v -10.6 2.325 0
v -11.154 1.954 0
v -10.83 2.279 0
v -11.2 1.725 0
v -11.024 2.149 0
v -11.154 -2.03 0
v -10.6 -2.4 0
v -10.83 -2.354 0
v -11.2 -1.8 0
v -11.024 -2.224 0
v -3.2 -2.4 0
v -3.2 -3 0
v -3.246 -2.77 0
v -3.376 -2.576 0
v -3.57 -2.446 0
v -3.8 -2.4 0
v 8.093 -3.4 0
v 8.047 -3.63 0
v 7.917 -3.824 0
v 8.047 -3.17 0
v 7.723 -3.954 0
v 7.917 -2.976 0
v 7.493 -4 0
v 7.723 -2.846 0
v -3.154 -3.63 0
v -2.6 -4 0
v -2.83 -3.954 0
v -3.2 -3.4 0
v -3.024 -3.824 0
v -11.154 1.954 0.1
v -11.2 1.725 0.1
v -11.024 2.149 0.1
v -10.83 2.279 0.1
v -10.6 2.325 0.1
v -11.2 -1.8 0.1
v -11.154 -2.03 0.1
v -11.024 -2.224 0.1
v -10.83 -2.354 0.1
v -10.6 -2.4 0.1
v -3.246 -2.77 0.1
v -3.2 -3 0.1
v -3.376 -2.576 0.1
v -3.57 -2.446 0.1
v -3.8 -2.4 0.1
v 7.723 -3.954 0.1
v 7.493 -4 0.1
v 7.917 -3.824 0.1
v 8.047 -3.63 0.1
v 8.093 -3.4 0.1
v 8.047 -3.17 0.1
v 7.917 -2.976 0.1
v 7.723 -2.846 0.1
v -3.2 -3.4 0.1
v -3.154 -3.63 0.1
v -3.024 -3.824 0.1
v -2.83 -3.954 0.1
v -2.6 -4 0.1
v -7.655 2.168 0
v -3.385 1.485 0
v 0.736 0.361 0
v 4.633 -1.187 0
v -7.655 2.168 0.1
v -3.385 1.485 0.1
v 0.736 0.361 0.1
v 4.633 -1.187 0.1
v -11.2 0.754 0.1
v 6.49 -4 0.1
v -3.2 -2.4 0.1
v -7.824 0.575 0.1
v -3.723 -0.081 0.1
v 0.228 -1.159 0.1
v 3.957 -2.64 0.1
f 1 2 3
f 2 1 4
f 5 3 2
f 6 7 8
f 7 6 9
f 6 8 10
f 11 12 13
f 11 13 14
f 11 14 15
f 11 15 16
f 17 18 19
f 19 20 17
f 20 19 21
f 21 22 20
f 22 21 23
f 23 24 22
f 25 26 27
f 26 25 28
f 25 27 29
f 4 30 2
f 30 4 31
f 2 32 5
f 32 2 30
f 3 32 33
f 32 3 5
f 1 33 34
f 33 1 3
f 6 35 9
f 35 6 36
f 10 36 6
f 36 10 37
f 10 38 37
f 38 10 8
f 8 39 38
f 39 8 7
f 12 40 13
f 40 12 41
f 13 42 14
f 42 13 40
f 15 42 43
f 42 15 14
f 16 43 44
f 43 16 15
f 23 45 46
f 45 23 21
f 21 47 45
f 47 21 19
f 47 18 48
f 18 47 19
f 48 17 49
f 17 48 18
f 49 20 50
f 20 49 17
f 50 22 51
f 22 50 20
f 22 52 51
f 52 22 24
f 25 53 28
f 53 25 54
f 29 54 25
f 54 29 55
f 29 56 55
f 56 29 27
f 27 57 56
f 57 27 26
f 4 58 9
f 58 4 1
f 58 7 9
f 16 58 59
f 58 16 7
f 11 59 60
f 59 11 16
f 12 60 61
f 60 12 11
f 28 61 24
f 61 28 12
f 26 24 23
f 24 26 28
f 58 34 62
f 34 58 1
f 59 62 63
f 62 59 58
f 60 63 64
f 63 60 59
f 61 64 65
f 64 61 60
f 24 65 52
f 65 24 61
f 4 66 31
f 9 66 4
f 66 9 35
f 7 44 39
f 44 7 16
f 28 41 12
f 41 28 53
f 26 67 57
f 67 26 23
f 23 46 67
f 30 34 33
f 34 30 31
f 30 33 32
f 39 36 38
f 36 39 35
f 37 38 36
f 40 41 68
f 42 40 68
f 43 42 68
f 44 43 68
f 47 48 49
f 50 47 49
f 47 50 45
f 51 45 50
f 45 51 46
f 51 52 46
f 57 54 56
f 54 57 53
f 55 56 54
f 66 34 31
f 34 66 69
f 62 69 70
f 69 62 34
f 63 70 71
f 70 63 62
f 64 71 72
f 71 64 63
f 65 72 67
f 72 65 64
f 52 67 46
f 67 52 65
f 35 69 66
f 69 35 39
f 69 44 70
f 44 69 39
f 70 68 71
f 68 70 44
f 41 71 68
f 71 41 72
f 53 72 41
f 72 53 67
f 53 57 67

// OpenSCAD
// file: ../p/7-16cyli.scad
use <../lib.scad>
function ldraw_lib__7_16cyli() = [
// 0 Cylinder 0.4375
// 0 Name: 7-16cyli.dat
// 0 Author: Magnus Forsberg [MagFors]
// 0 !LDRAW_ORG Primitive UPDATE 2024-01
// 0 !LICENSE Licensed under CC BY 4.0 : see CAreadme.txt
// 
// 0 BFC CERTIFY CCW
  [0,"BFC","CERTIFY"],
  [0,"BFC","CCW"],
// 
// 0 !HISTORY 2009-05-02 [PTadmin] Official Update 2009-01
// 0 !HISTORY 2024-01-03 [MagFors] Complete regeneration, original by guyvivan
// 0 !HISTORY 2024-01-29 [OrionP] Official Update 2024-01
// 
// 4 16 0.9239 0 0.3827 1 0 0 1 1 0 0.9239 1 0.3827
  [4,16,0.9239,0,0.3827,1,0,0,1,1,0,0.9239,1,0.3827],
// 4 16 0.7071 0 0.7071 0.9239 0 0.3827 0.9239 1 0.3827 0.7071 1 0.7071
  [4,16,0.7071,0,0.7071,0.9239,0,0.3827,0.9239,1,0.3827,0.7071,1,0.7071],
// 4 16 0.3827 0 0.9239 0.7071 0 0.7071 0.7071 1 0.7071 0.3827 1 0.9239
  [4,16,0.3827,0,0.9239,0.7071,0,0.7071,0.7071,1,0.7071,0.3827,1,0.9239],
// 4 16 0 0 1 0.3827 0 0.9239 0.3827 1 0.9239 0 1 1
  [4,16,0,0,1,0.3827,0,0.9239,0.3827,1,0.9239,0,1,1],
// 4 16 -0.3827 0 0.9239 0 0 1 0 1 1 -0.3827 1 0.9239
  [4,16,-0.3827,0,0.9239,0,0,1,0,1,1,-0.3827,1,0.9239],
// 4 16 -0.7071 0 0.7071 -0.3827 0 0.9239 -0.3827 1 0.9239 -0.7071 1 0.7071
  [4,16,-0.7071,0,0.7071,-0.3827,0,0.9239,-0.3827,1,0.9239,-0.7071,1,0.7071],
// 4 16 -0.9239 0 0.3827 -0.7071 0 0.7071 -0.7071 1 0.7071 -0.9239 1 0.3827
  [4,16,-0.9239,0,0.3827,-0.7071,0,0.7071,-0.7071,1,0.7071,-0.9239,1,0.3827],
// 0 // conditional lines
// 5 24 1 1 0 1 0 0 1 1 -0.4142 0.9239 1 0.3827
  [5,24,1,1,0,1,0,0,1,1,-0.4142,0.9239,1,0.3827],
// 5 24 0.9239 1 0.3827 0.9239 0 0.3827 1 1 0 0.7071 1 0.7071
  [5,24,0.9239,1,0.3827,0.9239,0,0.3827,1,1,0,0.7071,1,0.7071],
// 5 24 0.7071 1 0.7071 0.7071 0 0.7071 0.9239 1 0.3827 0.3827 1 0.9239
  [5,24,0.7071,1,0.7071,0.7071,0,0.7071,0.9239,1,0.3827,0.3827,1,0.9239],
// 5 24 0.3827 1 0.9239 0.3827 0 0.9239 0.7071 1 0.7071 0 1 1
  [5,24,0.3827,1,0.9239,0.3827,0,0.9239,0.7071,1,0.7071,0,1,1],
// 5 24 0 1 1 0 0 1 0.3827 1 0.9239 -0.3827 1 0.9239
  [5,24,0,1,1,0,0,1,0.3827,1,0.9239,-0.3827,1,0.9239],
// 5 24 -0.3827 1 0.9239 -0.3827 0 0.9239 0 1 1 -0.7071 1 0.7071
  [5,24,-0.3827,1,0.9239,-0.3827,0,0.9239,0,1,1,-0.7071,1,0.7071],
// 5 24 -0.7071 1 0.7071 -0.7071 0 0.7071 -0.3827 1 0.9239 -0.9239 1 0.3827
  [5,24,-0.7071,1,0.7071,-0.7071,0,0.7071,-0.3827,1,0.9239,-0.9239,1,0.3827],
// 5 24 -0.9239 1 0.3827 -0.9239 0 0.3827 -0.7071 1 0.7071 -1.0824 1 0
  [5,24,-0.9239,1,0.3827,-0.9239,0,0.3827,-0.7071,1,0.7071,-1.0824,1,0],
// 0 // Build by LDPartEditor (PrimGen 2.X)
];
module ldraw_lib__7_16cyli(step=0, col=false, unit=2/5, alt=false, line=0.2, solid=!$preview)
    makepoly(ldraw_lib__7_16cyli(), step=step, col=col, unit=unit, alt=alt, line=line, solid=solid);
ldraw_lib__7_16cyli(line=0.2);
// file: ../p/1-4cyli.scad
use <../lib.scad>
function ldraw_lib__1_4cyli() = [
// 0 Cylinder 0.25
// 0 Name: 1-4cyli.dat
// 0 Author: James Jessiman
// 0 !LDRAW_ORG Primitive UPDATE 2012-01
// 0 !LICENSE Licensed under CC BY 4.0 : see CAreadme.txt
// 
// 0 BFC CERTIFY CCW
  [0,"BFC","CERTIFY"],
  [0,"BFC","CCW"],
// 
// 0 !HISTORY 2002-03-23 [sbliss] Added BFC statement.
// 0 !HISTORY 2002-04-25 [PTadmin] Official Update 2002-02
// 0 !HISTORY 2007-06-22 [PTadmin] Header formatted for Contributor Agreement
// 0 !HISTORY 2008-07-01 [PTadmin] Official Update 2008-01
// 0 !HISTORY 2012-02-16 [Philo] Changed to CCW
// 0 !HISTORY 2012-03-30 [PTadmin] Official Update 2012-01
// 
// 
// 4 16 1 1 0 0.9239 1 0.3827 0.9239 0 0.3827 1 0 0
  [4,16,1,1,0,0.9239,1,0.3827,0.9239,0,0.3827,1,0,0],
// 5 24 1 0 0 1 1 0 0.9239 0 0.3827 1 0 -1
  [5,24,1,0,0,1,1,0,0.9239,0,0.3827,1,0,-1],
// 4 16 0.9239 1 0.3827 0.7071 1 0.7071 0.7071 0 0.7071 0.9239 0 0.3827
  [4,16,0.9239,1,0.3827,0.7071,1,0.7071,0.7071,0,0.7071,0.9239,0,0.3827],
// 5 24 0.9239 0 0.3827 0.9239 1 0.3827 0.7071 0 0.7071 1 0 0
  [5,24,0.9239,0,0.3827,0.9239,1,0.3827,0.7071,0,0.7071,1,0,0],
// 4 16 0.7071 1 0.7071 0.3827 1 0.9239 0.3827 0 0.9239 0.7071 0 0.7071
  [4,16,0.7071,1,0.7071,0.3827,1,0.9239,0.3827,0,0.9239,0.7071,0,0.7071],
// 5 24 0.7071 0 0.7071 0.7071 1 0.7071 0.3827 0 0.9239 0.9239 0 0.3827
  [5,24,0.7071,0,0.7071,0.7071,1,0.7071,0.3827,0,0.9239,0.9239,0,0.3827],
// 4 16 0.3827 1 0.9239 0 1 1 0 0 1 0.3827 0 0.9239
  [4,16,0.3827,1,0.9239,0,1,1,0,0,1,0.3827,0,0.9239],
// 5 24 0.3827 0 0.9239 0.3827 1 0.9239 0 0 1 0.7071 0 0.7071
  [5,24,0.3827,0,0.9239,0.3827,1,0.9239,0,0,1,0.7071,0,0.7071],
// 5 24 0 0 1 0 1 1 0.3827 0 0.9239 -1 0 1
  [5,24,0,0,1,0,1,1,0.3827,0,0.9239,-1,0,1],
];
module ldraw_lib__1_4cyli(step=0, col=false, unit=2/5, alt=false, line=0.2, solid=!$preview)
    makepoly(ldraw_lib__1_4cyli(), step=step, col=col, unit=unit, alt=alt, line=line, solid=solid);
ldraw_lib__1_4cyli(line=0.2);
// file: ../p/7-16chrd.scad
use <../lib.scad>
function ldraw_lib__7_16chrd() = [
// 0 Chord 0.4375
// 0 Name: 7-16chrd.dat
// 0 Author: Willy Tschager [Holly-Wood]
// 0 !LDRAW_ORG Primitive UPDATE 2024-01
// 0 !LICENSE Licensed under CC BY 4.0 : see CAreadme.txt
// 
// 0 BFC CERTIFY CCW
  [0,"BFC","CERTIFY"],
  [0,"BFC","CCW"],
// 
// 0 !HISTORY 2009-12-29 [PTadmin] Official Update 2009-03
// 0 !HISTORY 2024-01-10 [Holly-Wood] Complete re-write, original by guyvivan
// 0 !HISTORY 2024-01-29 [OrionP] Official Update 2024-01
// 
// 4 16 -.7071 0 .7071 -.9239 0 .3827 1 0 0 .9239 0 .3827
  [4,16,-.7071,0,.7071,-.9239,0,.3827,1,0,0,.9239,0,.3827],
// 4 16 -.7071 0 .7071 .9239 0 .3827 .7071 0 .7071 -.3827 0 .9239
  [4,16,-.7071,0,.7071,.9239,0,.3827,.7071,0,.7071,-.3827,0,.9239],
// 4 16 -.3827 0 .9239 .7071 0 .7071 .3827 0 .9239 0 0 1
  [4,16,-.3827,0,.9239,.7071,0,.7071,.3827,0,.9239,0,0,1],
// 0 // Based on LDPartEditor (PrimGen 2.X)
];
module ldraw_lib__7_16chrd(step=0, col=false, unit=2/5, alt=false, line=0.2, solid=!$preview)
    makepoly(ldraw_lib__7_16chrd(), step=step, col=col, unit=unit, alt=alt, line=line, solid=solid);
ldraw_lib__7_16chrd(line=0.2);
// file: ../p/1-4ndis.scad
use <../lib.scad>
function ldraw_lib__1_4ndis() = [
// 0 Disc Negative 0.25
// 0 Name: 1-4ndis.dat
// 0 Author: James Jessiman
// 0 !LDRAW_ORG Primitive UPDATE 2012-01
// 0 !LICENSE Licensed under CC BY 4.0 : see CAreadme.txt
// 
// 0 BFC CERTIFY CCW
  [0,"BFC","CERTIFY"],
  [0,"BFC","CCW"],
// 
// 0 !HISTORY 2002-03-23 [sbliss] Added BFC Statement
// 0 !HISTORY 2002-04-25 [PTadmin] Official Update 2002-02
// 0 !HISTORY 2007-06-22 [PTadmin] Header formatted for Contributor Agreement
// 0 !HISTORY 2008-07-01 [PTadmin] Official Update 2008-01
// 0 !HISTORY 2012-02-16 [Philo] Changed to CCW
// 0 !HISTORY 2012-03-30 [PTadmin] Official Update 2012-01
// 
// 
// 3 16 0.9239 0 0.3827 1 0 0 1 0 1
  [3,16,0.9239,0,0.3827,1,0,0,1,0,1],
// 3 16 0.7071 0 0.7071 0.9239 0 0.3827 1 0 1
  [3,16,0.7071,0,0.7071,0.9239,0,0.3827,1,0,1],
// 3 16 0.3827 0 0.9239 0.7071 0 0.7071 1 0 1
  [3,16,0.3827,0,0.9239,0.7071,0,0.7071,1,0,1],
// 3 16 0 0 1 0.3827 0 0.9239 1 0 1
  [3,16,0,0,1,0.3827,0,0.9239,1,0,1],
];
module ldraw_lib__1_4ndis(step=0, col=false, unit=2/5, alt=false, line=0.2, solid=!$preview)
    makepoly(ldraw_lib__1_4ndis(), step=step, col=col, unit=unit, alt=alt, line=line, solid=solid);
ldraw_lib__1_4ndis(line=0.2);
// file: ../p/1-4chrd.scad
use <../lib.scad>
function ldraw_lib__1_4chrd() = [
// 0 Chord 0.25
// 0 Name: 1-4chrd.dat
// 0 Author: Max Martin Richter [MMR1988]
// 0 !LDRAW_ORG Primitive UPDATE 2023-05
// 0 !LICENSE Licensed under CC BY 4.0 : see CAreadme.txt
// 
// 0 BFC CERTIFY CCW
  [0,"BFC","CERTIFY"],
  [0,"BFC","CCW"],
// 
// 0 !HISTORY 2004-04-22 [PTadmin] Official Update 2004-02
// 0 !HISTORY 2007-10-09 [PTadmin] Header formatted for Contributor Agreement
// 0 !HISTORY 2008-07-01 [PTadmin] Official Update 2008-01
// 0 !HISTORY 2012-08-02 [MMR1988] Re-creation with PrimGen2 and Rectifier
// 0 !HISTORY 2012-08-09 [PTadmin] Official Update 2012-02
// 0 !HISTORY 2023-10-27 [OrionP] Change author to MMR1988 from hafhead
// 0 !HISTORY 2023-10-31 [OrionP] Official Update 2023-05
// 
// 4 16 0.9239 0 0.3827 0.3827 0 0.9239 0 0 1 1 0 0
  [4,16,0.9239,0,0.3827,0.3827,0,0.9239,0,0,1,1,0,0],
// 3 16 0.7071 0 0.7071 0.3827 0 0.9239 0.9239 0 0.3827
  [3,16,0.7071,0,0.7071,0.3827,0,0.9239,0.9239,0,0.3827],
];
module ldraw_lib__1_4chrd(step=0, col=false, unit=2/5, alt=false, line=0.2, solid=!$preview)
    makepoly(ldraw_lib__1_4chrd(), step=step, col=col, unit=unit, alt=alt, line=line, solid=solid);
ldraw_lib__1_4chrd(line=0.2);
// file: s/stickerback008x024a.scad
use <../../lib.scad>
use <../../p/1-4chrd.scad>
use <../../p/1-4cyli.scad>
use <../../p/1-4ndis.scad>
use <../../p/7-16chrd.scad>
use <../../p/7-16cyli.scad>
function ldraw_lib__s__stickerback008x024a() = [
// 0 ~Sticker Back  0.8 x  2.4 for Side of Slope Brick Curved  3 x  1
// 0 Name: s\stickerback008x024a.dat
// 0 Author: Massimo Maso [Sirio]
// 0 !LDRAW_ORG Subpart UPDATE 2026-05
// 0 !LICENSE Licensed under CC BY 4.0 : see CAreadme.txt
// 
// 0 !HELP This is a stickerback, but it doesn't cover all the side of the 50950
// 
// 0 BFC CERTIFY CCW
  [0,"BFC","CERTIFY"],
  [0,"BFC","CCW"],
// 
// 0 !HISTORY 2026-05-31 [OrionP] Official Update 2026-05
// 
// 0 // Primitives
// 1 16 -26.5 0 4.3116 -1.5 0 0 0 -1 0 0 0 1.5 1-4chrd.dat
  [1,16,-26.5,0,4.3116,-1.5,0,0,0,-1,0,0,0,1.5, ldraw_lib__1_4chrd()],
// 1 16 -26.5 0 -4.5 -1.5 0 0 0 -1 0 0 0 -1.5 1-4chrd.dat
  [1,16,-26.5,0,-4.5,-1.5,0,0,0,-1,0,0,0,-1.5, ldraw_lib__1_4chrd()],
// 1 16 -9.5 0 -7.5 1.5 0 0 0 -1 0 0 0 1.5 1-4ndis.dat
  [1,16,-9.5,0,-7.5,1.5,0,0,0,-1,0,0,0,1.5, ldraw_lib__1_4ndis()],
// 1 16 18.7325 0 -8.5 0 0 1.5 0 -1 0 -1.5 0 0 7-16chrd.dat
  [1,16,18.7325,0,-8.5,0,0,1.5,0,-1,0,-1.5,0,0, ldraw_lib__7_16chrd()],
// 1 16 -6.5 0 -8.5 -1.5 0 0 0 -1 0 0 0 -1.5 1-4chrd.dat
  [1,16,-6.5,0,-8.5,-1.5,0,0,0,-1,0,0,0,-1.5, ldraw_lib__1_4chrd()],
// 1 16 -26.5 0 4.3116 -1.5 0 0 0 -.25 0 0 0 1.5 1-4cyli.dat
  [1,16,-26.5,0,4.3116,-1.5,0,0,0,-.25,0,0,0,1.5, ldraw_lib__1_4cyli()],
// 1 16 -26.5 0 -4.5 -1.5 0 0 0 -.25 0 0 0 -1.5 1-4cyli.dat
  [1,16,-26.5,0,-4.5,-1.5,0,0,0,-.25,0,0,0,-1.5, ldraw_lib__1_4cyli()],
// 0 BFC INVERTNEXT
  [0,"BFC","INVERTNEXT"],
// 1 16 -9.5 0 -7.5 1.5 0 0 0 -.25 0 0 0 1.5 1-4cyli.dat
  [1,16,-9.5,0,-7.5,1.5,0,0,0,-.25,0,0,0,1.5, ldraw_lib__1_4cyli()],
// 1 16 18.7325 0 -8.5 0 0 1.5 0 -.25 0 -1.5 0 0 7-16cyli.dat
  [1,16,18.7325,0,-8.5,0,0,1.5,0,-.25,0,-1.5,0,0, ldraw_lib__7_16cyli()],
// 1 16 -6.5 0 -8.5 -1.5 0 0 0 -.25 0 0 0 -1.5 1-4cyli.dat
  [1,16,-6.5,0,-8.5,-1.5,0,0,0,-.25,0,0,0,-1.5, ldraw_lib__1_4cyli()],
// 0 // Bottom faces
// 4 16 -19.1381 0 5.4212 -28 0 -4.5 -28 0 4.3116 -26.5 0 5.8116
  [4,16,-19.1381,0,5.4212,-28,0,-4.5,-28,0,4.3116,-26.5,0,5.8116],
// 3 16 -19.1381 0 5.4212 -26.5 0 -6 -28 0 -4.5
  [3,16,-19.1381,0,5.4212,-26.5,0,-6,-28,0,-4.5],
// 4 16 -19.1381 0 5.4212 -8.4622 0 3.7137 -9.5 0 -6 -26.5 0 -6
  [4,16,-19.1381,0,5.4212,-8.4622,0,3.7137,-9.5,0,-6,-26.5,0,-6],
// 4 16 1.8392 0 .9037 -8 0 -6 -9.5 0 -6 -8.4622 0 3.7137
  [4,16,1.8392,0,.9037,-8,0,-6,-9.5,0,-6,-8.4622,0,3.7137],
// 4 16 1.8392 0 .9037 11.5818 0 -2.9663 -8 0 -7.5 -8 0 -6
  [4,16,1.8392,0,.9037,11.5818,0,-2.9663,-8,0,-7.5,-8,0,-6],
// 4 16 -8 0 -8.5 -8 0 -7.5 11.5818 0 -2.9663 19.30655 0 -7.11415
  [4,16,-8,0,-8.5,-8,0,-7.5,11.5818,0,-2.9663,19.30655,0,-7.11415],
// 4 16 -8 0 -8.5 19.30655 0 -7.11415 18.7325 0 -10 -6.5 0 -10
  [4,16,-8,0,-8.5,19.30655,0,-7.11415,18.7325,0,-10,-6.5,0,-10],
// 0 // Lateral faces
// 4 16 -19.1381 0 5.4212 -26.5 0 5.8116 -26.5 -.25 5.8116 -19.1381 -.25 5.4212
  [4,16,-19.1381,0,5.4212,-26.5,0,5.8116,-26.5,-.25,5.8116,-19.1381,-.25,5.4212],
// 4 16 -19.1381 0 5.4212 -19.1381 -.25 5.4212 -8.4622 -.25 3.7137 -8.4622 0 3.7137
  [4,16,-19.1381,0,5.4212,-19.1381,-.25,5.4212,-8.4622,-.25,3.7137,-8.4622,0,3.7137],
// 4 16 1.8392 0 .9037 -8.4622 0 3.7137 -8.4622 -.25 3.7137 1.8392 -.25 .9037
  [4,16,1.8392,0,.9037,-8.4622,0,3.7137,-8.4622,-.25,3.7137,1.8392,-.25,.9037],
// 4 16 1.8392 0 .9037 1.8392 -.25 .9037 11.5818 -.25 -2.9663 11.5818 0 -2.9663
  [4,16,1.8392,0,.9037,1.8392,-.25,.9037,11.5818,-.25,-2.9663,11.5818,0,-2.9663],
// 4 16 19.30655 0 -7.11415 11.5818 0 -2.9663 11.5818 -.25 -2.9663 19.30655 -.25 -7.11415
  [4,16,19.30655,0,-7.11415,11.5818,0,-2.9663,11.5818,-.25,-2.9663,19.30655,-.25,-7.11415],
// 3 16 -28 0 4.3116 -28 -.25 1.8855 -28 -.25 4.3116
  [3,16,-28,0,4.3116,-28,-.25,1.8855,-28,-.25,4.3116],
// 4 16 -28 0 4.3116 -28 0 -4.5 -28 -.25 -4.5 -28 -.25 1.8855
  [4,16,-28,0,4.3116,-28,0,-4.5,-28,-.25,-4.5,-28,-.25,1.8855],
// 4 16 -26.5 0 -6 -9.5 0 -6 -9.5 -.25 -6 -26.5 -.25 -6
  [4,16,-26.5,0,-6,-9.5,0,-6,-9.5,-.25,-6,-26.5,-.25,-6],
// 4 16 -8 0 -7.5 -8 0 -8.5 -8 -.25 -8.5 -8 -.25 -7.5
  [4,16,-8,0,-7.5,-8,0,-8.5,-8,-.25,-8.5,-8,-.25,-7.5],
// 4 16 18.7325 0 -10 16.2256 -.25 -10 -6.5 -.25 -10 -6.5 0 -10
  [4,16,18.7325,0,-10,16.2256,-.25,-10,-6.5,-.25,-10,-6.5,0,-10],
// 3 16 18.7325 0 -10 18.7325 -.25 -10 16.2256 -.25 -10
  [3,16,18.7325,0,-10,18.7325,-.25,-10,16.2256,-.25,-10],
// 0 // Conditional lines
// 5 24 -26.5 0 5.8116 -26.5 -.25 5.8116 -19.1381 0 5.4212 -27.07405 0 5.69745
  [5,24,-26.5,0,5.8116,-26.5,-.25,5.8116,-19.1381,0,5.4212,-27.07405,0,5.69745],
// 5 24 -19.1381 0 5.4212 -19.1381 -.25 5.4212 -8.4622 0 3.7137 -26.5 0 5.8116
  [5,24,-19.1381,0,5.4212,-19.1381,-.25,5.4212,-8.4622,0,3.7137,-26.5,0,5.8116],
// 5 24 -8.4622 0 3.7137 -8.4622 -.25 3.7137 1.8392 0 .9037 -19.1381 0 5.4212
  [5,24,-8.4622,0,3.7137,-8.4622,-.25,3.7137,1.8392,0,.9037,-19.1381,0,5.4212],
// 5 24 1.8392 0 .9037 1.8392 -.25 .9037 11.5818 0 -2.9663 -8.4622 0 3.7137
  [5,24,1.8392,0,.9037,1.8392,-.25,.9037,11.5818,0,-2.9663,-8.4622,0,3.7137],
// 5 24 11.5818 0 -2.9663 11.5818 -.25 -2.9663 19.30655 0 -7.11415 1.8392 0 .9037
  [5,24,11.5818,0,-2.9663,11.5818,-.25,-2.9663,19.30655,0,-7.11415,1.8392,0,.9037],
// 5 24 19.30655 0 -7.11415 19.30655 -.25 -7.11415 19.79315 0 -7.43935 11.5818 0 -2.9663
  [5,24,19.30655,0,-7.11415,19.30655,-.25,-7.11415,19.79315,0,-7.43935,11.5818,0,-2.9663],
];
module ldraw_lib__s__stickerback008x024a(step=0, col=false, unit=2/5, alt=false, line=0.2, solid=!$preview)
    makepoly(ldraw_lib__s__stickerback008x024a(), step=step, col=col, unit=unit, alt=alt, line=line, solid=solid);
ldraw_lib__s__stickerback008x024a(line=0.2);
// file: s/6221655ads02.scad
use <../../lib.scad>
use <../../p/1-4chrd.scad>
use <../../p/1-4ndis.scad>
use <../../p/7-16chrd.scad>
function ldraw_lib__s__6221655ads02() = [
// 0 ~Sticker  0.8 x  2.4 with Black Curved Stripe on Lime Background Right - Top Face
// 0 Name: s\6221655ads02.dat
// 0 Author: Massimo Maso [Sirio]
// 0 !LDRAW_ORG Subpart UPDATE 2026-05
// 0 !LICENSE Licensed under CC BY 4.0 : see CAreadme.txt
// 
// 0 !HELP Stickers' geometry in common with set 75895 (sheet 6285381)
// 
// 0 BFC CERTIFY CCW
  [0,"BFC","CERTIFY"],
  [0,"BFC","CCW"],
// 
// 0 !HISTORY 2024-10-27 [OrionP] Official Update 2024-09
// 0 !HISTORY 2025-11-17 [Sirio] Adapted to new 50950 geometry
// 0 !HISTORY 2026-05-31 [OrionP] Official Update 2026-05
// 
// 0 // Primitives
// 1 0 -26.5 -.25 4.3116 -1.5 0 0 0 1 0 0 0 1.5 1-4chrd.dat
  [1,0,-26.5,-.25,4.3116,-1.5,0,0,0,1,0,0,0,1.5, ldraw_lib__1_4chrd()],
// 1 16 -26.5 -.25 -4.5 -1.5 0 0 0 1 0 0 0 -1.5 1-4chrd.dat
  [1,16,-26.5,-.25,-4.5,-1.5,0,0,0,1,0,0,0,-1.5, ldraw_lib__1_4chrd()],
// 1 16 -9.5 -.25 -7.5 1.5 0 0 0 1 0 0 0 1.5 1-4ndis.dat
  [1,16,-9.5,-.25,-7.5,1.5,0,0,0,1,0,0,0,1.5, ldraw_lib__1_4ndis()],
// 1 0 18.7325 -.25 -8.5 0 0 1.5 0 1 0 -1.5 0 0 7-16chrd.dat
  [1,0,18.7325,-.25,-8.5,0,0,1.5,0,1,0,-1.5,0,0, ldraw_lib__7_16chrd()],
// 1 16 -6.5 -.25 -8.5 -1.5 0 0 0 1 0 0 0 -1.5 1-4chrd.dat
  [1,16,-6.5,-.25,-8.5,-1.5,0,0,0,1,0,0,0,-1.5, ldraw_lib__1_4chrd()],
// 0 // Black faces
// 4 0 -19.5611 -.25 1.438 -26.5 -.25 5.8116 -28 -.25 4.3116 -28 -.25 1.8855
  [4,0,-19.5611,-.25,1.438,-26.5,-.25,5.8116,-28,-.25,4.3116,-28,-.25,1.8855],
// 4 0 -19.5611 -.25 1.438 -9.3068 -.25 -.202 -19.1381 -.25 5.4212 -26.5 -.25 5.8116
  [4,0,-19.5611,-.25,1.438,-9.3068,-.25,-.202,-19.1381,-.25,5.4212,-26.5,-.25,5.8116],
// 4 0 .5706 -.25 -2.8964 -8.4622 -.25 3.7137 -19.1381 -.25 5.4212 -9.3068 -.25 -.202
  [4,0,.5706,-.25,-2.8964,-8.4622,-.25,3.7137,-19.1381,-.25,5.4212,-9.3068,-.25,-.202],
// 4 0 .5706 -.25 -2.8964 9.8918 -.25 -6.599 1.8392 -.25 .9037 -8.4622 -.25 3.7137
  [4,0,.5706,-.25,-2.8964,9.8918,-.25,-6.599,1.8392,-.25,.9037,-8.4622,-.25,3.7137],
// 4 0 16.2256 -.25 -10 11.5818 -.25 -2.9663 1.8392 -.25 .9037 9.8918 -.25 -6.599
  [4,0,16.2256,-.25,-10,11.5818,-.25,-2.9663,1.8392,-.25,.9037,9.8918,-.25,-6.599],
// 4 0 16.2256 -.25 -10 18.7325 -.25 -10 19.30655 -.25 -7.11415 11.5818 -.25 -2.9663
  [4,0,16.2256,-.25,-10,18.7325,-.25,-10,19.30655,-.25,-7.11415,11.5818,-.25,-2.9663],
// 0 // Green faces
// 4 16 -26.5 -.25 -6 -19.5611 -.25 1.438 -28 -.25 1.8855 -28 -.25 -4.5
  [4,16,-26.5,-.25,-6,-19.5611,-.25,1.438,-28,-.25,1.8855,-28,-.25,-4.5],
// 4 16 -26.5 -.25 -6 -9.5 -.25 -6 -9.3068 -.25 -.202 -19.5611 -.25 1.438
  [4,16,-26.5,-.25,-6,-9.5,-.25,-6,-9.3068,-.25,-.202,-19.5611,-.25,1.438],
// 4 16 -8 -.25 -6 .5706 -.25 -2.8964 -9.3068 -.25 -.202 -9.5 -.25 -6
  [4,16,-8,-.25,-6,.5706,-.25,-2.8964,-9.3068,-.25,-.202,-9.5,-.25,-6],
// 4 16 -8 -.25 -6 -8 -.25 -7.5 9.8918 -.25 -6.599 .5706 -.25 -2.8964
  [4,16,-8,-.25,-6,-8,-.25,-7.5,9.8918,-.25,-6.599,.5706,-.25,-2.8964],
// 4 16 -8 -.25 -8.5 16.2256 -.25 -10 9.8918 -.25 -6.599 -8 -.25 -7.5
  [4,16,-8,-.25,-8.5,16.2256,-.25,-10,9.8918,-.25,-6.599,-8,-.25,-7.5],
// 3 16 -8 -.25 -8.5 -6.5 -.25 -10 16.2256 -.25 -10
  [3,16,-8,-.25,-8.5,-6.5,-.25,-10,16.2256,-.25,-10],
];
module ldraw_lib__s__6221655ads02(step=0, col=false, unit=2/5, alt=false, line=0.2, solid=!$preview)
    makepoly(ldraw_lib__s__6221655ads02(), step=step, col=col, unit=unit, alt=alt, line=line, solid=solid);
ldraw_lib__s__6221655ads02(line=0.2);
// main file
use <../lib.scad>
use <s/6221655ads02.scad>
use <s/stickerback008x024a.scad>
function ldraw_lib__6221655ad() = [
// 0 Sticker  0.8 x  2.4 with Black Curved Stripe on Lime Background Right
// 0 Name: 6221655ad.dat
// 0 Author: Massimo Maso [Sirio]
// 0 !LDRAW_ORG Part UPDATE 2026-05
// 0 !LICENSE Licensed under CC BY 4.0 : see CAreadme.txt
// 
// 0 !HELP Stickers' geometry in common with set 75895 (sheet 6285381)
// 
// 0 BFC CERTIFY CCW
  [0,"BFC","CERTIFY"],
  [0,"BFC","CCW"],
// 
// 0 !KEYWORDS 3.0, 911 RSR, Bricklink 75888stk01, Brickowl 925236, bumper, front
// 0 !KEYWORDS Porsche, Rebrickable 37801, Set 75888, Speed Champions, Turbo
// 
// 0 !HISTORY 2024-10-27 [OrionP] Official Update 2024-09
// 0 !HISTORY 2025-11-17 [Sirio] Adapted to new 50950 geometry; subparted for use in set 75895
// 0 !HISTORY 2026-05-31 [OrionP] Official Update 2026-05
// 
// 1 16 0 0 0 1 0 0 0 1 0 0 0 1 s\stickerback008x024a.dat
  [1,16,0,0,0,1,0,0,0,1,0,0,0,1, ldraw_lib__s__stickerback008x024a()],
// 1 27 0 0 0 1 0 0 0 1 0 0 0 1 s\6221655ads02.dat
  [1,27,0,0,0,1,0,0,0,1,0,0,0,1, ldraw_lib__s__6221655ads02()],
];
module ldraw_lib__6221655ad(step=0, col=false, unit=2/5, alt=false, line=0.2, solid=!$preview)
    makepoly(ldraw_lib__6221655ad(), step=step, col=col, unit=unit, alt=alt, line=line, solid=solid);
ldraw_lib__6221655ad(line=0.2);
